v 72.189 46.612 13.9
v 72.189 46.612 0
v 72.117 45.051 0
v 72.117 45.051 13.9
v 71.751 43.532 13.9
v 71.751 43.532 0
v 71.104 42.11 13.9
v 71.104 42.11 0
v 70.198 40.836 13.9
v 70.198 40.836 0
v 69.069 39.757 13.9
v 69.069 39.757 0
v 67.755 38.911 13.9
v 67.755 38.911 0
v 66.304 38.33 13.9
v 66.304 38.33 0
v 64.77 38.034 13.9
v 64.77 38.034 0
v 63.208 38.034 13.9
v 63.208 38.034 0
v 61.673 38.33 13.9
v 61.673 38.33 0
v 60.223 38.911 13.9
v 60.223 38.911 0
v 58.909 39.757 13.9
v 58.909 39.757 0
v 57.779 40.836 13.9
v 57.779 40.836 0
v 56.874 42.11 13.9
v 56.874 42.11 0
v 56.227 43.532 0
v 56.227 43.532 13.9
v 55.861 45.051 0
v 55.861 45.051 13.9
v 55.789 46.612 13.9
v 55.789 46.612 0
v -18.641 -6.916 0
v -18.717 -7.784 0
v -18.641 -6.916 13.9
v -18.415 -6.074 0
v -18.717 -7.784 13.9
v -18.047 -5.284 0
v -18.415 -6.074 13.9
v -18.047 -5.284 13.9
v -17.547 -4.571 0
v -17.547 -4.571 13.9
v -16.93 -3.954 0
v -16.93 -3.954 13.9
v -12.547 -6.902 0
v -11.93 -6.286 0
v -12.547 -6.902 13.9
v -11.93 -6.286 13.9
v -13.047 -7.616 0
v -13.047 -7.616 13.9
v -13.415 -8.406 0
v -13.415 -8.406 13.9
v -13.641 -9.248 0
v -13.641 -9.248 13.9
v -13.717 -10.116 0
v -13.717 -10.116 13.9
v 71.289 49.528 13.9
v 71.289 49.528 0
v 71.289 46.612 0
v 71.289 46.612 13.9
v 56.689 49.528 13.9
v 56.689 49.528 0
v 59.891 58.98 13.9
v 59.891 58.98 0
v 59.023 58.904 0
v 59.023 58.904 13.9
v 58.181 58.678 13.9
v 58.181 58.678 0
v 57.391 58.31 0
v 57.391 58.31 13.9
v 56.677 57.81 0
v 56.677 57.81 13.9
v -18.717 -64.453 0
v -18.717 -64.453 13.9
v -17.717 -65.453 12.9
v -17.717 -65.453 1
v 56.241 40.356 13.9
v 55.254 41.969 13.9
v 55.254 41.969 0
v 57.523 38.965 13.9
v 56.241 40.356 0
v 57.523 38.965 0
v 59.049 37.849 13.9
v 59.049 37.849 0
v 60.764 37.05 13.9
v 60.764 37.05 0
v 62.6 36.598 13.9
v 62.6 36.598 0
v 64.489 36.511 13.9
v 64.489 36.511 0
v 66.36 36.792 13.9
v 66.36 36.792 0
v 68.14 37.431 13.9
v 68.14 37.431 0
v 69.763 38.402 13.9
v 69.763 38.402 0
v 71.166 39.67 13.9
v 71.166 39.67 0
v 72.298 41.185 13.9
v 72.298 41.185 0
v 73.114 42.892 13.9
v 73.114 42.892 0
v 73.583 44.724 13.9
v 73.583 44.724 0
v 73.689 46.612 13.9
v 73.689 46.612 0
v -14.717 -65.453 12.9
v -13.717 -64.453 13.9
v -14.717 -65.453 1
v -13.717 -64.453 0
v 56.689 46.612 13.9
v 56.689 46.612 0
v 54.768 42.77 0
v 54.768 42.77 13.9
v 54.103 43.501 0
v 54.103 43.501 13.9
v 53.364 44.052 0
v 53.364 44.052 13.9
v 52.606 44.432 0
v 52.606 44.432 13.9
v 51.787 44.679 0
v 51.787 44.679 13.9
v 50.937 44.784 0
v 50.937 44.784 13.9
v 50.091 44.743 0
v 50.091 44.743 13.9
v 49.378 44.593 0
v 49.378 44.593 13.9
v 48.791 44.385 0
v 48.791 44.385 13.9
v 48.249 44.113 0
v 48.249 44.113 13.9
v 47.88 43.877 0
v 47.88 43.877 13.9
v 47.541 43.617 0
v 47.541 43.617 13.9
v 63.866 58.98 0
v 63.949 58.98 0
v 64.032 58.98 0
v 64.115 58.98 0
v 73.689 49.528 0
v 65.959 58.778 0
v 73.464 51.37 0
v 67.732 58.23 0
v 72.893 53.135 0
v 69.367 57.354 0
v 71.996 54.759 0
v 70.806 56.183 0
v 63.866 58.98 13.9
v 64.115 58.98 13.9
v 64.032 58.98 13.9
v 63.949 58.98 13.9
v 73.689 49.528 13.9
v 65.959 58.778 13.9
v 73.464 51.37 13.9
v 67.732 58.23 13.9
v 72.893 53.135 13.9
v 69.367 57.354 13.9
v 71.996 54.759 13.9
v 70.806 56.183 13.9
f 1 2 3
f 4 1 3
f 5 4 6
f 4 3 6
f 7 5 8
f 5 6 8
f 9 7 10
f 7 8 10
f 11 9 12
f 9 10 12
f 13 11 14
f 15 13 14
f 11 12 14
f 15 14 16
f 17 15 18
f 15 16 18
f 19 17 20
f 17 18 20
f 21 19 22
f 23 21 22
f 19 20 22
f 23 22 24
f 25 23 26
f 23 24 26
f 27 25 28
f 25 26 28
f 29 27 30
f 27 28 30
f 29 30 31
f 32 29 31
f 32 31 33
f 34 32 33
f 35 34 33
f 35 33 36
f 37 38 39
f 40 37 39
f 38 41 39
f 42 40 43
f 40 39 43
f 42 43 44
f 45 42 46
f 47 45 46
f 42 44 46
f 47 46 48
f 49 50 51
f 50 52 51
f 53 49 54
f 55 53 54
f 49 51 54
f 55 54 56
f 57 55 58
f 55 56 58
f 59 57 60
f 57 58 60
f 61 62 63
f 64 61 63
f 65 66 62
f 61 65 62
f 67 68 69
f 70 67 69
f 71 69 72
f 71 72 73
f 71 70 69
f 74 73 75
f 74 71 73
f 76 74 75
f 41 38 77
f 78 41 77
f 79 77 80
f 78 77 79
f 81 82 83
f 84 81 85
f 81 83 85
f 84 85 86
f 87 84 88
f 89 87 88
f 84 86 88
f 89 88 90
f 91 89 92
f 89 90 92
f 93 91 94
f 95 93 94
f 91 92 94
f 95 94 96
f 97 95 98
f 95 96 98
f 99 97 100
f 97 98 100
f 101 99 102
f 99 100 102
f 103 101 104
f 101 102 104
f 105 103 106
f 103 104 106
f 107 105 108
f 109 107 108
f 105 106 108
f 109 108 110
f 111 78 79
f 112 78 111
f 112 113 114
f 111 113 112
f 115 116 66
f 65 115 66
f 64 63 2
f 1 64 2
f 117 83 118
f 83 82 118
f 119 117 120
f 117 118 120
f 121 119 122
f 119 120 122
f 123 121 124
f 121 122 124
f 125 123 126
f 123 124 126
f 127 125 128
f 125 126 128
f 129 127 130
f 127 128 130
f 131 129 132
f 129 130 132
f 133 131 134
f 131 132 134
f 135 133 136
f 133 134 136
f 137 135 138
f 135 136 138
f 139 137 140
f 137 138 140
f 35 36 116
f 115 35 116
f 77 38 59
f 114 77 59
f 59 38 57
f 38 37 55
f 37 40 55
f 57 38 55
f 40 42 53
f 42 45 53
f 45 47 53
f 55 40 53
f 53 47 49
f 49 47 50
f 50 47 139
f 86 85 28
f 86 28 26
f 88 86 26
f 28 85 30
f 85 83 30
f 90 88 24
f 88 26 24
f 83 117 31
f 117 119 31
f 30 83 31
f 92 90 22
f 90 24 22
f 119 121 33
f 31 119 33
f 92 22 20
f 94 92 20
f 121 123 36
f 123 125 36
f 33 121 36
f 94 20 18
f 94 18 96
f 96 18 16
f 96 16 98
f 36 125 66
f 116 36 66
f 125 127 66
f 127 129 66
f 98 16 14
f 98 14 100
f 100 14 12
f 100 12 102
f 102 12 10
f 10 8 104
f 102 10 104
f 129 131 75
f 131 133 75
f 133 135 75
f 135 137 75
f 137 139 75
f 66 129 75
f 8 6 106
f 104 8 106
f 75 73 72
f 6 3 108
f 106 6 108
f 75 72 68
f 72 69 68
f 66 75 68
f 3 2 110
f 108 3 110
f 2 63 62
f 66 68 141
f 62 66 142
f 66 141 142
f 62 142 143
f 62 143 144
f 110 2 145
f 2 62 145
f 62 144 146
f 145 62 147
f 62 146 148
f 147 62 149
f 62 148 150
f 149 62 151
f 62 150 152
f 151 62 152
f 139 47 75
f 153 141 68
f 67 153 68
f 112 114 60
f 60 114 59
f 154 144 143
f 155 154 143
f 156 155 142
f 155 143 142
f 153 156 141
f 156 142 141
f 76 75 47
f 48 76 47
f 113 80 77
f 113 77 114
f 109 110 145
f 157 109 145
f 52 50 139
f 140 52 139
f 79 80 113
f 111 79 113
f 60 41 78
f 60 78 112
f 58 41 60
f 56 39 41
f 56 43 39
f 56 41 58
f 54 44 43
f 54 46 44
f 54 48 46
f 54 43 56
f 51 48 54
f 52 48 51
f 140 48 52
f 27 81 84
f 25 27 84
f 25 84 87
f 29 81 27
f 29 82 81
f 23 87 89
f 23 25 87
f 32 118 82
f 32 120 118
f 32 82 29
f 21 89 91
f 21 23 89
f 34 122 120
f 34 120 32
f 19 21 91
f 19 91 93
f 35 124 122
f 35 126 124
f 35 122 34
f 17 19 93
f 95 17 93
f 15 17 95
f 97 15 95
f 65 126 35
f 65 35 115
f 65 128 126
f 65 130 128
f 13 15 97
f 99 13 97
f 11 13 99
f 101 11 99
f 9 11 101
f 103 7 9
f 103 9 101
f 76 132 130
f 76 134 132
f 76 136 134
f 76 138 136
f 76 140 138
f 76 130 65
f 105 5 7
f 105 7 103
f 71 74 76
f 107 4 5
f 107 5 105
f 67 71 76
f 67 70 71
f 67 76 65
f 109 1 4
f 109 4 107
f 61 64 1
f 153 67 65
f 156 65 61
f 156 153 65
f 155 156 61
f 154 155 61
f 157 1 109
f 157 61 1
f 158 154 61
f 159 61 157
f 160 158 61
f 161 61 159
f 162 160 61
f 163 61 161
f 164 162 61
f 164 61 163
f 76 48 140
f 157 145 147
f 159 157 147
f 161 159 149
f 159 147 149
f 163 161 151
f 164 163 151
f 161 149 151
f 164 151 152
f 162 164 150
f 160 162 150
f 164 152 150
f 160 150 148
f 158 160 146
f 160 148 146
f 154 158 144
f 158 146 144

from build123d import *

# Parameters (mm, degrees)
F1_DEPTH = 13.9
F2_R     = 5
F3_R     = 5
F4_R     = 5
F5_SIZE  = 1


with BuildPart() as f1:
    # F0 (on Top) → F1 (new body)
    with BuildSketch(Plane.XY):
        with BuildLine():
            Line((-18.716553, -5.452939), (-18.716553, -65.452939))
            Line((-18.716553, -65.452939), (-13.716553, -65.452939))
            Line((-13.716553, -65.452939), (-13.716553, -7.784481))
            Line((-13.716553, -7.784481), (54.288781, 49.278771))
            ThreePointArc((54.288781, 49.278771), (57.086409, 56.09465), (63.865801, 58.979571))
            Line((63.865801, 58.979571), (58.071121, 58.979571))
            Line((58.071121, 58.979571), (-18.716553, -5.452939))
        make_face()
        with BuildLine():
            Line((64.114961, 58.979571), (63.865801, 58.979571))
            ThreePointArc((63.865801, 58.979571), (57.086409, 56.09465), (54.288781, 49.278771))
            Line((54.288781, 49.278771), (54.288781, 46.61191))
            ThreePointArc((54.288781, 46.61191), (63.988781, 36.498362), (73.688781, 46.61191))
            Line((73.688781, 46.61191), (73.688781, 49.52791))
            ThreePointArc((73.688781, 49.52791), (70.80626, 56.182743), (64.114961, 58.979571))
        make_face()
        with BuildLine():
            Line((56.688781, 49.52791), (71.288781, 49.52791))
            Line((71.288781, 49.52791), (71.288781, 46.61191))
            Line((71.288781, 46.61191), (72.188781, 46.61191))
            ThreePointArc((72.188781, 46.61191), (63.988781, 37.996817), (55.788781, 46.61191))
            Line((55.788781, 46.61191), (56.688781, 46.61191))
            Line((56.688781, 46.61191), (56.688781, 49.52791))
        make_face(mode=Mode.SUBTRACT)
        with BuildLine():
            ThreePointArc((64.114961, 58.979571), (63.990381, 58.98037), (63.865801, 58.979571))
            Line((63.865801, 58.979571), (64.114961, 58.979571))
        make_face()
    extrude(amount=F1_DEPTH)

    # F2
    f2_edges = [f1.edges().sort_by_distance(p)[0] for p in [
        (58.071121, 58.979571, 6.95),
    ]]
    fillet(f2_edges, radius=F2_R)

    # F3
    f3_edges = [f1.edges().sort_by_distance(p)[0] for p in [
        (54.288781, 49.278771, 6.95),
    ]]
    fillet(f3_edges, radius=F3_R)

    # F4
    f4_edges = [f1.edges().sort_by_distance(p)[0] for p in [
        (-13.716553, -7.784481, 6.95),
        (-18.716553, -5.452939, 6.95),
    ]]
    fillet(f4_edges, radius=F4_R)

    # F5
    f5_edges = [f1.edges().sort_by_distance(p)[0] for p in [
        (-18.716553, -65.452939, 6.95),
        (-16.216553, -65.452939, 13.9),
        (-13.716553, -65.452939, 6.95),
        (-16.216553, -65.452939, 0),
    ]]
    chamfer(f5_edges, length=F5_SIZE)


solid = f1.part
